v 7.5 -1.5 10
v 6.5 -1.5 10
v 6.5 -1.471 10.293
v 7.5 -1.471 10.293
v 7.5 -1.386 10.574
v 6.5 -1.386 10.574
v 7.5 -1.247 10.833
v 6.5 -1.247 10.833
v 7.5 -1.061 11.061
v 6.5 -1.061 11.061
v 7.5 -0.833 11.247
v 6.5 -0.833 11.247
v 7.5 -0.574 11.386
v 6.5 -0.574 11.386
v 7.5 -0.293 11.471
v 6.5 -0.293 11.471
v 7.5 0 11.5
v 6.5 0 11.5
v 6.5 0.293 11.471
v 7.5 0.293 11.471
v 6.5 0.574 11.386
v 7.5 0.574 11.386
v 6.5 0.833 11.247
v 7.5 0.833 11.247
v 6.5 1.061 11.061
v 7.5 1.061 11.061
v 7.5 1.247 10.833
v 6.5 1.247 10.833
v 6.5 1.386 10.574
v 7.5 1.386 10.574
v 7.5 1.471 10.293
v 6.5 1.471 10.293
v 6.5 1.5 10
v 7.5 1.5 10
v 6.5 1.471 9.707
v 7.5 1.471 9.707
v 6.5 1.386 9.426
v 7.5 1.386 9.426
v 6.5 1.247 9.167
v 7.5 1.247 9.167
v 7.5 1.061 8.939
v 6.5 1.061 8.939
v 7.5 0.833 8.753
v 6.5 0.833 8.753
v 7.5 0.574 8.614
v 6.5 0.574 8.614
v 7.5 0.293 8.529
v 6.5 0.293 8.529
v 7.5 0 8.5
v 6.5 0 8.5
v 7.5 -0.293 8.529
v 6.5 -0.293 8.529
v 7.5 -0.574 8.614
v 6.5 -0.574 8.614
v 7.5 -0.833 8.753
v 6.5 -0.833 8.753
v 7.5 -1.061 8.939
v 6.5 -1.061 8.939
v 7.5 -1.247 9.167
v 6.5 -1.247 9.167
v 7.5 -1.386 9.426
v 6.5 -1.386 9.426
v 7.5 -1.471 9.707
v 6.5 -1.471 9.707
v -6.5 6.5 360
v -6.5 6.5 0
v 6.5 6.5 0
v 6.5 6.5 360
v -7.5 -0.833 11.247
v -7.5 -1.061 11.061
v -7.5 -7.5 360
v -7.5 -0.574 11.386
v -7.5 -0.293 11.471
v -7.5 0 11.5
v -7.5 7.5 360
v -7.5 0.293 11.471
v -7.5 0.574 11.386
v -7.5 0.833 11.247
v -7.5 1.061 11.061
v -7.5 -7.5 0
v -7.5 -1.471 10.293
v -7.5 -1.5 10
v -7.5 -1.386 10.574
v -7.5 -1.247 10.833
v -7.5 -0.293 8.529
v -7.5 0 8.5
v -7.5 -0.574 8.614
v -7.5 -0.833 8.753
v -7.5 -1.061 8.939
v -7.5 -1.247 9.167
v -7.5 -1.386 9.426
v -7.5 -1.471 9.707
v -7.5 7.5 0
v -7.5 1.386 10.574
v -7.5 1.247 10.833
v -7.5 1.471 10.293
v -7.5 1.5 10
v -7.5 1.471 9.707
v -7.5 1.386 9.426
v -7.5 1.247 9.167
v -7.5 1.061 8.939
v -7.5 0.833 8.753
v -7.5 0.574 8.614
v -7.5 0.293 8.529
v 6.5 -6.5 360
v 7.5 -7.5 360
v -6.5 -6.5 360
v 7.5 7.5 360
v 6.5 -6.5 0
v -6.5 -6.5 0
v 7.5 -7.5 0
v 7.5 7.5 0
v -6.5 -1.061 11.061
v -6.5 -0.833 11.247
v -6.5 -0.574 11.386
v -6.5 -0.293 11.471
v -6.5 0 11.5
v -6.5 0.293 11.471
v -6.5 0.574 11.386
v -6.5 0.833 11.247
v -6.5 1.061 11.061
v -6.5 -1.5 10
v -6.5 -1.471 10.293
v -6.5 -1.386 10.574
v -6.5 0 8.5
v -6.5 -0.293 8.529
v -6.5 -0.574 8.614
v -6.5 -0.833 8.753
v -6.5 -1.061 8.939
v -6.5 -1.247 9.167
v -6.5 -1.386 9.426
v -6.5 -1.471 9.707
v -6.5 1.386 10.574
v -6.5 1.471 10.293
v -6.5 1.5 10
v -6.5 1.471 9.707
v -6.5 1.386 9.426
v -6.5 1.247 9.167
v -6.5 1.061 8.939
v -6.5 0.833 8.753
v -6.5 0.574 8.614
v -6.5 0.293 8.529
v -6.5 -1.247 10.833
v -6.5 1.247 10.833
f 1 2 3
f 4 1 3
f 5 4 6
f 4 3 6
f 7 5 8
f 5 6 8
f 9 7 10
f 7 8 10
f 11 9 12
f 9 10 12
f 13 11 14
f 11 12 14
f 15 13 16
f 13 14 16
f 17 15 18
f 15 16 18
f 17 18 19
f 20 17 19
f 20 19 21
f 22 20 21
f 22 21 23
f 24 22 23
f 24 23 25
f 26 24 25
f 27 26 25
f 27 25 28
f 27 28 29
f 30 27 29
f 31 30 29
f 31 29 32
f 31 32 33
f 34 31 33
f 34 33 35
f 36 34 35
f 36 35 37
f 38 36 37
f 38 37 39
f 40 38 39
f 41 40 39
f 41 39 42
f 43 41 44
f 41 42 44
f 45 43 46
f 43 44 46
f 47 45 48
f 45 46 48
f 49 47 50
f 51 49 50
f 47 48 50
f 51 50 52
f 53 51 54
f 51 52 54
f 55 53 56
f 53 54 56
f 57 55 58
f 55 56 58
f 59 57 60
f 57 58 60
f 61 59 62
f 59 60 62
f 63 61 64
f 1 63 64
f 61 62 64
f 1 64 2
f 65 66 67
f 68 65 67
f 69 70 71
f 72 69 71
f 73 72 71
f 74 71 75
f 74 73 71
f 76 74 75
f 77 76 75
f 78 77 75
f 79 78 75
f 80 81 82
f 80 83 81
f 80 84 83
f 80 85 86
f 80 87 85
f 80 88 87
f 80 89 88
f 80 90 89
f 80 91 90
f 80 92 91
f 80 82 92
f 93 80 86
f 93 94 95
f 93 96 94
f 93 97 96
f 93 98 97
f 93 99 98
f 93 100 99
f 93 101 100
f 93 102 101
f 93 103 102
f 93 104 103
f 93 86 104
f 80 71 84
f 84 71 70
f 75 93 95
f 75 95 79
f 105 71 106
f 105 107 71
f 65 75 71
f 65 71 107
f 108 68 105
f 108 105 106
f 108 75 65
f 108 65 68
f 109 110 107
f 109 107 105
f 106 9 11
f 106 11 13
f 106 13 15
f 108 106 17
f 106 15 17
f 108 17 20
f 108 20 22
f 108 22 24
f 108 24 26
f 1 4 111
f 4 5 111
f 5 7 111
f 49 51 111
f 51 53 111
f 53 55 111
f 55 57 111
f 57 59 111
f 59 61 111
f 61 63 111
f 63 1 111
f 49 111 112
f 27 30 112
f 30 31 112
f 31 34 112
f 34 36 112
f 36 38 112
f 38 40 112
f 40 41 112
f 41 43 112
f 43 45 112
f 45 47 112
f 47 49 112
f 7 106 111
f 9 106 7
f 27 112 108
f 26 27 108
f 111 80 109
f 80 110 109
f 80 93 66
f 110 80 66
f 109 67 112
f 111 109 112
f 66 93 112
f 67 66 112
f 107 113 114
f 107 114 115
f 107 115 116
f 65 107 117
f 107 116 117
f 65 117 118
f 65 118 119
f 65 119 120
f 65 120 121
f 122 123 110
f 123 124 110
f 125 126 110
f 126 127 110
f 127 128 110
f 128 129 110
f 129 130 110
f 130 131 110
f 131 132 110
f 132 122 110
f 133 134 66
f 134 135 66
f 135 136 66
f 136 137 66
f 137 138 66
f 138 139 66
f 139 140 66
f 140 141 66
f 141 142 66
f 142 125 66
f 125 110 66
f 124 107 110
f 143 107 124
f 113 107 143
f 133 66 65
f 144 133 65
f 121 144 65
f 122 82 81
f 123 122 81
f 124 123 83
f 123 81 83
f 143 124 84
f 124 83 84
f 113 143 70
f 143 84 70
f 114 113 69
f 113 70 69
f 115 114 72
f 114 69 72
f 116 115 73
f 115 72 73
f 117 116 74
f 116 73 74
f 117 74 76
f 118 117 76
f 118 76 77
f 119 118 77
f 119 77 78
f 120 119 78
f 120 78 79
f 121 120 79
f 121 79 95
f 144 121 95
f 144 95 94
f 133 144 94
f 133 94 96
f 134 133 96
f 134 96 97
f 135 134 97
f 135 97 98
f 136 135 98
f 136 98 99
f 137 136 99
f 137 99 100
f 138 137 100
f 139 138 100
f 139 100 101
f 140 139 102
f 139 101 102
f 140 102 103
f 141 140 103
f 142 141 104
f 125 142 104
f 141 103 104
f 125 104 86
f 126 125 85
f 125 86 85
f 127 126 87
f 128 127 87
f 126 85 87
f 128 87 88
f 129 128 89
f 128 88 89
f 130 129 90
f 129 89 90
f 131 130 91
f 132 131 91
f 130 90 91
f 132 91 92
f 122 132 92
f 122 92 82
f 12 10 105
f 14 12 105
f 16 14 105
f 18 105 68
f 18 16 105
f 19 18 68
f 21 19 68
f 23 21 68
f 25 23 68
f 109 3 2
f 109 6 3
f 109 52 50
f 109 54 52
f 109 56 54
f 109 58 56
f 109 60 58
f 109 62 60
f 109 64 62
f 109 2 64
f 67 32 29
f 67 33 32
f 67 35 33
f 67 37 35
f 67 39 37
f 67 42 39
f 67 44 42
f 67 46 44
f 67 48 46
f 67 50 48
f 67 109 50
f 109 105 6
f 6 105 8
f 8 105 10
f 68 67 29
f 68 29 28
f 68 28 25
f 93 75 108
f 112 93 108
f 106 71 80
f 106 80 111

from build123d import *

# Parameters (mm, degrees)
SKETCH_1_W          = 15
SKETCH_1_H          = 15
SKETCH_1_W_2        = 13
SKETCH_1_H_2        = 13
EXTRUDE_1_DEPTH     = 360
SKETCH_2_R          = 1.5
CUT_EXTRUDE_1_DEPTH = 25


with BuildPart() as part:
    # 草图1 → 凸台-拉伸1 (new body)
    with BuildSketch(Plane.XY):
        Rectangle(SKETCH_1_W, SKETCH_1_H)
        Rectangle(SKETCH_1_W_2, SKETCH_1_H_2, mode=Mode.SUBTRACT)
    extrude(amount=EXTRUDE_1_DEPTH)

    # 草图2 → 切除-拉伸1 (cut)
    with BuildSketch(Plane.ZY.offset(7.5)):
        with Locations(Location((10, 0, 0), (0, 0, 270))):
            Circle(SKETCH_2_R)
    extrude(amount=-CUT_EXTRUDE_1_DEPTH, mode=Mode.SUBTRACT)


solid = part.part
